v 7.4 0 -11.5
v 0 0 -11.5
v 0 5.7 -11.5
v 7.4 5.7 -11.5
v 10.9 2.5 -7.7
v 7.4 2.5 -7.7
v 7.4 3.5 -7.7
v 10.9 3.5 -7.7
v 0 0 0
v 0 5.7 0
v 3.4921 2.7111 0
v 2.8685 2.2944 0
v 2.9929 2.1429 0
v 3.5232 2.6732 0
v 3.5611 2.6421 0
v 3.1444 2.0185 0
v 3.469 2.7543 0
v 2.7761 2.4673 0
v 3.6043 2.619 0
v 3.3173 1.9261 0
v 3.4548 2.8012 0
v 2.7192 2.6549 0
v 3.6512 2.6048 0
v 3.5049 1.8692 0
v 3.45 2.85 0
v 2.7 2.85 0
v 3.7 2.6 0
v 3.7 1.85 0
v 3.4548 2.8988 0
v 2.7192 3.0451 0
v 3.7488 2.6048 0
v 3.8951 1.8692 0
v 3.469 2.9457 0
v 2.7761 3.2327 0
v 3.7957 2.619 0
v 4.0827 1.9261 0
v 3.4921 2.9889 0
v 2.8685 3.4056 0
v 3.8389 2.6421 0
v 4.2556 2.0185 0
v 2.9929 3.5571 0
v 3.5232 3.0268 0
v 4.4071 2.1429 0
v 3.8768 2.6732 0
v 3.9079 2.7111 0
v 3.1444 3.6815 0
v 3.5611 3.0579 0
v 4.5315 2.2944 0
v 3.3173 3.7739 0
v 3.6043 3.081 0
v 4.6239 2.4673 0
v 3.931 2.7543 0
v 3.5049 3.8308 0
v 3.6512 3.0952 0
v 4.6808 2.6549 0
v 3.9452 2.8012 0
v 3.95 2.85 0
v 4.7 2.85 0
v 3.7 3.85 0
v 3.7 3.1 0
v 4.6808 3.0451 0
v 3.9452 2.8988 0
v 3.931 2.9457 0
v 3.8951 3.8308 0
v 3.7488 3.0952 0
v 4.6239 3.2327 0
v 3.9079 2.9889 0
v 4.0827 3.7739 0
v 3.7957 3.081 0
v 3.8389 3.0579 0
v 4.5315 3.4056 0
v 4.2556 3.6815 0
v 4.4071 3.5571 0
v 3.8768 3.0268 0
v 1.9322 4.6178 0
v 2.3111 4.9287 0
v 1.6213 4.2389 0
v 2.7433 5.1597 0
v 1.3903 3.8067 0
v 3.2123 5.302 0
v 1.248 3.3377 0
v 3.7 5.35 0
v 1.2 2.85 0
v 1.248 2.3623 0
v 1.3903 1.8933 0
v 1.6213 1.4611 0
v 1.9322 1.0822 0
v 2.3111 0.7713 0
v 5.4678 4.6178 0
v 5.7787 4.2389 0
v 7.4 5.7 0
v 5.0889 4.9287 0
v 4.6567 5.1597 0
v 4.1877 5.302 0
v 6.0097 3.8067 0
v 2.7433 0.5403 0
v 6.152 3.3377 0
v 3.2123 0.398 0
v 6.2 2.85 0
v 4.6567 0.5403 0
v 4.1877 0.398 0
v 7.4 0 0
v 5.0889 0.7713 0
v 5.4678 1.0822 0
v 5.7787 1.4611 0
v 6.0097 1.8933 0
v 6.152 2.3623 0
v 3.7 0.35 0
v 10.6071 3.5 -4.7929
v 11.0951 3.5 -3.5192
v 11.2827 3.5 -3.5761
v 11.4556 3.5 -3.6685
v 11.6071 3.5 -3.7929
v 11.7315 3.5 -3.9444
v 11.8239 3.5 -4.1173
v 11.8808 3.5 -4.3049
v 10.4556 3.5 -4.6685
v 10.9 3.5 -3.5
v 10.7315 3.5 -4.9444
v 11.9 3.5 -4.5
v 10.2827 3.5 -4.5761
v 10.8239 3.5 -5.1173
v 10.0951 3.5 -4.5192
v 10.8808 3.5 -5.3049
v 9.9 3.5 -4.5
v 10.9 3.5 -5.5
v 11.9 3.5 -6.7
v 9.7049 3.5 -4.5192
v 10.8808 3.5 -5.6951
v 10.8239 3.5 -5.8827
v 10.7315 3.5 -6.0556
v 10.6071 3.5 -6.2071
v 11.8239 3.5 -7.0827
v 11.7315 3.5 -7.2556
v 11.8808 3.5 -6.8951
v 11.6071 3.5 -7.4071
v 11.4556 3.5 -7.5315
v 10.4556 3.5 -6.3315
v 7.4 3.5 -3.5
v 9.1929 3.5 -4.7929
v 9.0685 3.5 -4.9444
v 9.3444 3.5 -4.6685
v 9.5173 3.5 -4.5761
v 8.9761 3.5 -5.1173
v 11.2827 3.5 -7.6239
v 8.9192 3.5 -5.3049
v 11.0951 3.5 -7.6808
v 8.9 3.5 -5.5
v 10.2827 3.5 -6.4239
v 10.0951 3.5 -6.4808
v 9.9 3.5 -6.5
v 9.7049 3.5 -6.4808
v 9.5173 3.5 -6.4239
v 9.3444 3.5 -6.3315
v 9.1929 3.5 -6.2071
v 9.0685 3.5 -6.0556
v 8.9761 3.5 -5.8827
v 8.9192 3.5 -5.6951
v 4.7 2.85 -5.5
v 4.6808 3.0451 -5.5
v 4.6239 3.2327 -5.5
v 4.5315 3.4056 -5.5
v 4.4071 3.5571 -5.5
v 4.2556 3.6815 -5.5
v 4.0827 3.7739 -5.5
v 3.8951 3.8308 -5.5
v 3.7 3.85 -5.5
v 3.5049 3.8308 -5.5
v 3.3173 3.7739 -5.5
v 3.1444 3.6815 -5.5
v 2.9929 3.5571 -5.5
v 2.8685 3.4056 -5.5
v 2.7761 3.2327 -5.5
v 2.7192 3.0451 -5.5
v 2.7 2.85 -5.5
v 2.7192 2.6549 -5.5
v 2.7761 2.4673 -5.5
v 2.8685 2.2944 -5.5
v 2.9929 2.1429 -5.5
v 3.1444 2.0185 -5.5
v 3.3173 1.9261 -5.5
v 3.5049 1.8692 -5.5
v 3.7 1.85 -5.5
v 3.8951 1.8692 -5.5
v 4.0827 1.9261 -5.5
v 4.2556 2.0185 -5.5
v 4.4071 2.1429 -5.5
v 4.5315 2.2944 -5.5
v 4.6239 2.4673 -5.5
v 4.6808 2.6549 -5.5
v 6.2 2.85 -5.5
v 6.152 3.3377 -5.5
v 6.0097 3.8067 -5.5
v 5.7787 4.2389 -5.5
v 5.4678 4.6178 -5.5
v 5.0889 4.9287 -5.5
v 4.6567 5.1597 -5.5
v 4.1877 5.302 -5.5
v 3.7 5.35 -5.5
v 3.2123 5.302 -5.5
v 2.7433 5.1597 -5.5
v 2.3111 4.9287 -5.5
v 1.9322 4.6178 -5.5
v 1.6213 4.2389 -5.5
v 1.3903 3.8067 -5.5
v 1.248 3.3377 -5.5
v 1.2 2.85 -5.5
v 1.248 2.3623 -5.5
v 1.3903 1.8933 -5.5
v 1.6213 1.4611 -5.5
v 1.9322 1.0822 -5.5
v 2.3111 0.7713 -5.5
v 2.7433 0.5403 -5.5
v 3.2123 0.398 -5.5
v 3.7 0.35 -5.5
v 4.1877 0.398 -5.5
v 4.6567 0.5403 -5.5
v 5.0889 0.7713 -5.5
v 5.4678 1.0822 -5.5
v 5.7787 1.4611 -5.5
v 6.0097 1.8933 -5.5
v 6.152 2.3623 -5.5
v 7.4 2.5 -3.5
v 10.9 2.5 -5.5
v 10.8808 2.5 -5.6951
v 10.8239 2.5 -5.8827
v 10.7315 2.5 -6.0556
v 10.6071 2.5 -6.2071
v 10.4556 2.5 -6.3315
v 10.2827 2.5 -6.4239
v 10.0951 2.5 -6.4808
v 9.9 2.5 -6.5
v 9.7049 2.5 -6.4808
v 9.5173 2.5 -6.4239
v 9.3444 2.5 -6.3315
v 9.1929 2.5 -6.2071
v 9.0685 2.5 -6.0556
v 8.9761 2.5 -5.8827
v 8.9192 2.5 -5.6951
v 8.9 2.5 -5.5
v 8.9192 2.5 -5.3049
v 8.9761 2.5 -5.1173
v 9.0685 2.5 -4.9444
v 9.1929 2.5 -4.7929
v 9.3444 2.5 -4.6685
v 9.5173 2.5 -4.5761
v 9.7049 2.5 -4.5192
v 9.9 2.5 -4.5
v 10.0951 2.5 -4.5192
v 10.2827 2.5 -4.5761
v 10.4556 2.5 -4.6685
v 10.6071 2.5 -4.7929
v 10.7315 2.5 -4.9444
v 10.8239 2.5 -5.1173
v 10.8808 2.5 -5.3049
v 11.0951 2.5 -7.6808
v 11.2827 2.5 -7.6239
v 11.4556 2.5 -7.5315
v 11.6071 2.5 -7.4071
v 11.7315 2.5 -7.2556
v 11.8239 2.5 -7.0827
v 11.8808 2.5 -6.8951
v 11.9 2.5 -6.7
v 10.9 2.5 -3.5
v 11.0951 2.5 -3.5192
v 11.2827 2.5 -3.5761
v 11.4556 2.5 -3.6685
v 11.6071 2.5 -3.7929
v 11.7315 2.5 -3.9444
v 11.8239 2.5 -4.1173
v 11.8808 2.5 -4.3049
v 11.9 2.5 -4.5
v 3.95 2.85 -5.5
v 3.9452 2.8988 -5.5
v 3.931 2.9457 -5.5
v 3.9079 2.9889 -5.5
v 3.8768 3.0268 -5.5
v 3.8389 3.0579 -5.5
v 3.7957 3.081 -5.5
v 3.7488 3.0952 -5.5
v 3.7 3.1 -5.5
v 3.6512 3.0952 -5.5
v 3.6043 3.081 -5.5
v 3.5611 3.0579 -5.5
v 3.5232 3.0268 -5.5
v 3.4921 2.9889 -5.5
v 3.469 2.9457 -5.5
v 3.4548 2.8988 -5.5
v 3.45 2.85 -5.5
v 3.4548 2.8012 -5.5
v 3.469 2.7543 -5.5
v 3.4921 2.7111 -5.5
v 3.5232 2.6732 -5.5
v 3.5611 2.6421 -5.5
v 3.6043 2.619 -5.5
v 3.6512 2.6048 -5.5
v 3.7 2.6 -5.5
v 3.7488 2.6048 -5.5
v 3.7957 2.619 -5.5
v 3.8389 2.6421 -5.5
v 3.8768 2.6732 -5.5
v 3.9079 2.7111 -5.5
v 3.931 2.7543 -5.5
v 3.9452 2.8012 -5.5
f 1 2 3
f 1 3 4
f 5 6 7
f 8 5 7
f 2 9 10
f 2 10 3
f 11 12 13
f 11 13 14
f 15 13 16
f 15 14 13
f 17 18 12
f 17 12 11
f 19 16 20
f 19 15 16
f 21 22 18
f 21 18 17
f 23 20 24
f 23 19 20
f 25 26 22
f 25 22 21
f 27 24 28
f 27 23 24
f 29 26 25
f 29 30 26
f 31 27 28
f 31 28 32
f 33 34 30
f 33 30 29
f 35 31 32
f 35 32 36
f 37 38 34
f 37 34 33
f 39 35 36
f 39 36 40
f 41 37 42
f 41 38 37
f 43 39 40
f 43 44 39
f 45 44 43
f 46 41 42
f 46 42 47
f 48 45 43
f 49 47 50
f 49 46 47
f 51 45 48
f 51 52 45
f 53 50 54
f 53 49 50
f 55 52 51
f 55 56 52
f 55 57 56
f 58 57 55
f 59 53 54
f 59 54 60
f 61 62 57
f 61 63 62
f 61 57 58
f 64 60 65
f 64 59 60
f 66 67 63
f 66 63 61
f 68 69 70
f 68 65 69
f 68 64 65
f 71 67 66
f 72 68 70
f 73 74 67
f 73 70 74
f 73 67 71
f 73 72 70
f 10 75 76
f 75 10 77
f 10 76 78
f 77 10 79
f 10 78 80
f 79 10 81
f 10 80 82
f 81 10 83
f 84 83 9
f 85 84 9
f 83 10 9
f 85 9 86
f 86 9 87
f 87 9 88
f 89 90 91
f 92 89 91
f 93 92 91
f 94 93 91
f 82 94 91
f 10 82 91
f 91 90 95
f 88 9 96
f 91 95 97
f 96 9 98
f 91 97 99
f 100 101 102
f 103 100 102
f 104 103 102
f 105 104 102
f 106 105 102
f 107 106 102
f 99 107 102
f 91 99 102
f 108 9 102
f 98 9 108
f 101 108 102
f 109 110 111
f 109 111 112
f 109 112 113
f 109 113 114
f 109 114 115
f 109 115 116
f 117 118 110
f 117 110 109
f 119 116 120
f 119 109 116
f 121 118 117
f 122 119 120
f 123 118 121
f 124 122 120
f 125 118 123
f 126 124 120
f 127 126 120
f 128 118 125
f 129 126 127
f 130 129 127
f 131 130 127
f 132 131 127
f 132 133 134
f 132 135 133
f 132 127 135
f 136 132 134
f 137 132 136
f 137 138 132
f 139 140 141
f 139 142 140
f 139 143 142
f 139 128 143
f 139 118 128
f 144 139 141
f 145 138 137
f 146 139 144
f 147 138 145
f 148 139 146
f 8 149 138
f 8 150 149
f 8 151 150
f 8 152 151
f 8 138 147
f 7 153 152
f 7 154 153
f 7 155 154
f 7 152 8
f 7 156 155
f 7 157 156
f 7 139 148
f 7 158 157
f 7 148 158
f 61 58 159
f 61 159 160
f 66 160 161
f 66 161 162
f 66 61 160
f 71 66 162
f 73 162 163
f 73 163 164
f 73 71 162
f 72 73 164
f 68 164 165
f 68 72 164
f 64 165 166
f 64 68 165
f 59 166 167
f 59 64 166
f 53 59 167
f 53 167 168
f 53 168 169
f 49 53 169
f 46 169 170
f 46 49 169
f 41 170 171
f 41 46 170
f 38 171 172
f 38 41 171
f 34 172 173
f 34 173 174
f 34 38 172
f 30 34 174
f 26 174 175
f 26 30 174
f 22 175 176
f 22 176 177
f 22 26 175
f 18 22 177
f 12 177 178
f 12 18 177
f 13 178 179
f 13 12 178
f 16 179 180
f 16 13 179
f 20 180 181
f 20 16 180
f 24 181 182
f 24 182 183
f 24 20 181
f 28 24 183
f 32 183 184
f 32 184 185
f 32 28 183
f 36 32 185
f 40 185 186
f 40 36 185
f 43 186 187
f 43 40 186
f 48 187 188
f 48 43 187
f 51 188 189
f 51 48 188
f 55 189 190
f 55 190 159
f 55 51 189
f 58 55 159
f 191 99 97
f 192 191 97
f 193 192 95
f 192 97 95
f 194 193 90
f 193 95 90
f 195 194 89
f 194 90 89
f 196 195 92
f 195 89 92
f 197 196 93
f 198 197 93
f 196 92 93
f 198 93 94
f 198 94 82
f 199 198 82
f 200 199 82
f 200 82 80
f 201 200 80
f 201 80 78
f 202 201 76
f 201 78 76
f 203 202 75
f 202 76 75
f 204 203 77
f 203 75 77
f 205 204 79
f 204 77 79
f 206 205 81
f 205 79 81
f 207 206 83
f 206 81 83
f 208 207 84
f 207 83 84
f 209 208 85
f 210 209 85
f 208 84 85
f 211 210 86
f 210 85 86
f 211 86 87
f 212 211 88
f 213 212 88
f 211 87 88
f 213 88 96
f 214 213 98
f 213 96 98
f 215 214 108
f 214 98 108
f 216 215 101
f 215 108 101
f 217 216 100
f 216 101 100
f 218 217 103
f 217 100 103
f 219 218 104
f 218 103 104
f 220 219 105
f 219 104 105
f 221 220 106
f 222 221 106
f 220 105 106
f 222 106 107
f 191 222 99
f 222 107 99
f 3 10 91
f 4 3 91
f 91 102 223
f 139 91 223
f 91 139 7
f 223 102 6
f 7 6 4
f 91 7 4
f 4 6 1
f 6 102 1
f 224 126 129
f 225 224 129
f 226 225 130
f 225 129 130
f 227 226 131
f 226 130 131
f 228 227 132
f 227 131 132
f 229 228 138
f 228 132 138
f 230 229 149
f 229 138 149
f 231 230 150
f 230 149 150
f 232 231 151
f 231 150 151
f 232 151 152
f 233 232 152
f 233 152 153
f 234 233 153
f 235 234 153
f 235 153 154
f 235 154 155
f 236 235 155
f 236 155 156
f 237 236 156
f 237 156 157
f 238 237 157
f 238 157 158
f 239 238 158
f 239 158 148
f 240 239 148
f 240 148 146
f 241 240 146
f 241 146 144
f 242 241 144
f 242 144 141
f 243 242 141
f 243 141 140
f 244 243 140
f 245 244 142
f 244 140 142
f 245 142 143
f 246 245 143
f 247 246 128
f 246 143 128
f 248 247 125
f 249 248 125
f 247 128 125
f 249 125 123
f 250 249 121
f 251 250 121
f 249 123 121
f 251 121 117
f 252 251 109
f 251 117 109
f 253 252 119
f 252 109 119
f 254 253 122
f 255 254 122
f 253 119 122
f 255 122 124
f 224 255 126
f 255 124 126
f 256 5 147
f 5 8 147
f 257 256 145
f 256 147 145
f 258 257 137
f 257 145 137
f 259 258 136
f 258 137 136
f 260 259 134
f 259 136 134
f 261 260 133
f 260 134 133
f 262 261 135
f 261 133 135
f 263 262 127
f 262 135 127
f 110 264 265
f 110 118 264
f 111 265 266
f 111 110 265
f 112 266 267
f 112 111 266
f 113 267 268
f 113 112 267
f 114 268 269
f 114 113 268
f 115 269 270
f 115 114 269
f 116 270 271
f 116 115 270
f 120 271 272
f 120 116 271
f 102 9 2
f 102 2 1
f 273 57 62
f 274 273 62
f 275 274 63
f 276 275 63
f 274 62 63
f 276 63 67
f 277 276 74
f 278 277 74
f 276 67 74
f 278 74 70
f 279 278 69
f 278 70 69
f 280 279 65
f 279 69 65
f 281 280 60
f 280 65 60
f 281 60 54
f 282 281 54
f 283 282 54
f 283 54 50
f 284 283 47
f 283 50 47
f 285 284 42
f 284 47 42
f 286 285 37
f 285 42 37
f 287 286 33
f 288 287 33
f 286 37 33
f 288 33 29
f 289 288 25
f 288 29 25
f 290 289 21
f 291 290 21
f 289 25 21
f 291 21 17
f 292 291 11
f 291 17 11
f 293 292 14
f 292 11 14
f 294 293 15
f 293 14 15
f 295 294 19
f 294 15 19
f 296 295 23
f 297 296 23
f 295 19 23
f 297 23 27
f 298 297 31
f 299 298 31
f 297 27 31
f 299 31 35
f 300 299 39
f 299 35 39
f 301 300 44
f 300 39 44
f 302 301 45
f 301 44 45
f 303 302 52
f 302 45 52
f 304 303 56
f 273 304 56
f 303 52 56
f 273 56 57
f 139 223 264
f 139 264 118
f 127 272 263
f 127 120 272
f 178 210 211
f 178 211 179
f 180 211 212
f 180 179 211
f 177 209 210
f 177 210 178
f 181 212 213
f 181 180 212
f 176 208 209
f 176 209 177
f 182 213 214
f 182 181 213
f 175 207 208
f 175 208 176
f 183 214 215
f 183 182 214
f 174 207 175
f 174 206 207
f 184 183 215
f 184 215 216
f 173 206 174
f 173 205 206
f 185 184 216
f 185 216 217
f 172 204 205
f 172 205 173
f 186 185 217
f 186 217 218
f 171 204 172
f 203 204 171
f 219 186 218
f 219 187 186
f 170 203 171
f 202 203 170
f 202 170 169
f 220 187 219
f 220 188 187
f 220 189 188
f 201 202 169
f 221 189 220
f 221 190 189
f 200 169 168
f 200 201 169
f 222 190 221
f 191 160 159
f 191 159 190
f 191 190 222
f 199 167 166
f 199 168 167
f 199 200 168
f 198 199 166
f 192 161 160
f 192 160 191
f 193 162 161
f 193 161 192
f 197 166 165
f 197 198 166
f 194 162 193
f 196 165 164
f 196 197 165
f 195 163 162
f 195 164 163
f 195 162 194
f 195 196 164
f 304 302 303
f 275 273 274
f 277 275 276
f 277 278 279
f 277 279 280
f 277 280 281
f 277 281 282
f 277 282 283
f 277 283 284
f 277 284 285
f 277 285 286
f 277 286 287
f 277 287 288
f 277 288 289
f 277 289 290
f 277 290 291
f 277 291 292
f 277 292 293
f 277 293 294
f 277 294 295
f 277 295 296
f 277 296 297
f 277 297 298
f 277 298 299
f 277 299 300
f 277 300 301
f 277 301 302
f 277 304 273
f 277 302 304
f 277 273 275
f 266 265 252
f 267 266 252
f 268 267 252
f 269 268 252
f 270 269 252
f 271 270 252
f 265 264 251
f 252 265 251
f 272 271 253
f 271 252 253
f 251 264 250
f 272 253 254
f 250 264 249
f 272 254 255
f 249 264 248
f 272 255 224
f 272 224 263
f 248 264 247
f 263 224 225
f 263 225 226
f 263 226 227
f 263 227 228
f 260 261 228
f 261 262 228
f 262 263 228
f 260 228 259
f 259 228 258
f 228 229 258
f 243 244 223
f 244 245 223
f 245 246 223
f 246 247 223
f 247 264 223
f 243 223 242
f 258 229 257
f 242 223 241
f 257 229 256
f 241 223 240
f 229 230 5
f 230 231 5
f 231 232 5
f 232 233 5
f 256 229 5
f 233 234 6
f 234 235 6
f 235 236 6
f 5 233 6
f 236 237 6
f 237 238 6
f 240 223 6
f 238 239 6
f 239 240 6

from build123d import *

# Parameters (mm, degrees)
SKETCH1_W           = 7.4
SKETCH1_H           = 11.5
BOSS_EXTRUDE1_DEPTH = 5.7
SKETCH2_R           = 2.5
CUT_EXTRUDE1_DEPTH  = 5.5
SKETCH3_R           = 1
BOSS_EXTRUDE2_DEPTH = 5.5
SKETCH4_R           = 0.25
CUT_EXTRUDE2_DEPTH  = 5.5
SKETCH5_W           = 4.2
SKETCH5_H           = 1
BOSS_EXTRUDE3_DEPTH = 4.5
FILLET1_R           = 1
CUT_EXTRUDE3_REACH  = 5.5
SKETCH6_R           = 1


with BuildPart() as part:
    # Sketch1 → Boss-Extrude1 (new body)
    with BuildSketch(Plane(origin=(0, 0, 0), x_dir=(1, 0, 0), z_dir=(0, 1, 0))):
        with Locations((3.7, 5.75)):
            Rectangle(SKETCH1_W, SKETCH1_H)
    extrude(amount=BOSS_EXTRUDE1_DEPTH)

    # Sketch2 → Cut-Extrude1 (cut)
    with BuildSketch(Plane.XY):
        with Locations((3.7, 2.85)):
            Circle(SKETCH2_R)
    extrude(amount=-CUT_EXTRUDE1_DEPTH, mode=Mode.SUBTRACT)

    # Sketch3 → Boss-Extrude2 (add)
    with BuildSketch(Plane.XY):
        with Locations((3.7, 2.85)):
            Circle(SKETCH3_R)
    extrude(amount=-BOSS_EXTRUDE2_DEPTH)

    # Sketch4 → Cut-Extrude2 (cut)
    with BuildSketch(Plane.XY):
        with Locations((3.7, 2.85)):
            Circle(SKETCH4_R)
    extrude(amount=-CUT_EXTRUDE2_DEPTH, mode=Mode.SUBTRACT)

    # Sketch5 → Boss-Extrude3 (add)
    with BuildSketch(Plane(origin=(7.4, 0, 0), x_dir=(0, 0, -1), z_dir=(1, 0, 0))):
        with Locations((5.6, 3)):
            Rectangle(SKETCH5_W, SKETCH5_H)
    extrude(amount=BOSS_EXTRUDE3_DEPTH)

    # Fillet1
    fillet1_edges = [part.edges().sort_by_distance(p)[0] for p in [
        (11.9, 3, -3.5),
        (11.9, 3, -7.7),
    ]]
    fillet(fillet1_edges, radius=FILLET1_R)

    # Sketch6 → Cut-Extrude3 (cut, up to next)
    with BuildSketch(Plane(origin=(0, 3.5, 0), x_dir=(1, 0, 0), z_dir=(0, 1, 0)), mode=Mode.PRIVATE) as cut_extrude3_sk1:
        with Locations((9.9, 5.5)):
            Circle(SKETCH6_R)
    cut_extrude3_tool1 = extrude(cut_extrude3_sk1.sketch, amount=-CUT_EXTRUDE3_REACH, mode=Mode.PRIVATE) & part.part
    add(cut_extrude3_tool1.solids().sort_by_distance((9.9, 3.5, -5.5))[0], mode=Mode.SUBTRACT)


solid = part.part
